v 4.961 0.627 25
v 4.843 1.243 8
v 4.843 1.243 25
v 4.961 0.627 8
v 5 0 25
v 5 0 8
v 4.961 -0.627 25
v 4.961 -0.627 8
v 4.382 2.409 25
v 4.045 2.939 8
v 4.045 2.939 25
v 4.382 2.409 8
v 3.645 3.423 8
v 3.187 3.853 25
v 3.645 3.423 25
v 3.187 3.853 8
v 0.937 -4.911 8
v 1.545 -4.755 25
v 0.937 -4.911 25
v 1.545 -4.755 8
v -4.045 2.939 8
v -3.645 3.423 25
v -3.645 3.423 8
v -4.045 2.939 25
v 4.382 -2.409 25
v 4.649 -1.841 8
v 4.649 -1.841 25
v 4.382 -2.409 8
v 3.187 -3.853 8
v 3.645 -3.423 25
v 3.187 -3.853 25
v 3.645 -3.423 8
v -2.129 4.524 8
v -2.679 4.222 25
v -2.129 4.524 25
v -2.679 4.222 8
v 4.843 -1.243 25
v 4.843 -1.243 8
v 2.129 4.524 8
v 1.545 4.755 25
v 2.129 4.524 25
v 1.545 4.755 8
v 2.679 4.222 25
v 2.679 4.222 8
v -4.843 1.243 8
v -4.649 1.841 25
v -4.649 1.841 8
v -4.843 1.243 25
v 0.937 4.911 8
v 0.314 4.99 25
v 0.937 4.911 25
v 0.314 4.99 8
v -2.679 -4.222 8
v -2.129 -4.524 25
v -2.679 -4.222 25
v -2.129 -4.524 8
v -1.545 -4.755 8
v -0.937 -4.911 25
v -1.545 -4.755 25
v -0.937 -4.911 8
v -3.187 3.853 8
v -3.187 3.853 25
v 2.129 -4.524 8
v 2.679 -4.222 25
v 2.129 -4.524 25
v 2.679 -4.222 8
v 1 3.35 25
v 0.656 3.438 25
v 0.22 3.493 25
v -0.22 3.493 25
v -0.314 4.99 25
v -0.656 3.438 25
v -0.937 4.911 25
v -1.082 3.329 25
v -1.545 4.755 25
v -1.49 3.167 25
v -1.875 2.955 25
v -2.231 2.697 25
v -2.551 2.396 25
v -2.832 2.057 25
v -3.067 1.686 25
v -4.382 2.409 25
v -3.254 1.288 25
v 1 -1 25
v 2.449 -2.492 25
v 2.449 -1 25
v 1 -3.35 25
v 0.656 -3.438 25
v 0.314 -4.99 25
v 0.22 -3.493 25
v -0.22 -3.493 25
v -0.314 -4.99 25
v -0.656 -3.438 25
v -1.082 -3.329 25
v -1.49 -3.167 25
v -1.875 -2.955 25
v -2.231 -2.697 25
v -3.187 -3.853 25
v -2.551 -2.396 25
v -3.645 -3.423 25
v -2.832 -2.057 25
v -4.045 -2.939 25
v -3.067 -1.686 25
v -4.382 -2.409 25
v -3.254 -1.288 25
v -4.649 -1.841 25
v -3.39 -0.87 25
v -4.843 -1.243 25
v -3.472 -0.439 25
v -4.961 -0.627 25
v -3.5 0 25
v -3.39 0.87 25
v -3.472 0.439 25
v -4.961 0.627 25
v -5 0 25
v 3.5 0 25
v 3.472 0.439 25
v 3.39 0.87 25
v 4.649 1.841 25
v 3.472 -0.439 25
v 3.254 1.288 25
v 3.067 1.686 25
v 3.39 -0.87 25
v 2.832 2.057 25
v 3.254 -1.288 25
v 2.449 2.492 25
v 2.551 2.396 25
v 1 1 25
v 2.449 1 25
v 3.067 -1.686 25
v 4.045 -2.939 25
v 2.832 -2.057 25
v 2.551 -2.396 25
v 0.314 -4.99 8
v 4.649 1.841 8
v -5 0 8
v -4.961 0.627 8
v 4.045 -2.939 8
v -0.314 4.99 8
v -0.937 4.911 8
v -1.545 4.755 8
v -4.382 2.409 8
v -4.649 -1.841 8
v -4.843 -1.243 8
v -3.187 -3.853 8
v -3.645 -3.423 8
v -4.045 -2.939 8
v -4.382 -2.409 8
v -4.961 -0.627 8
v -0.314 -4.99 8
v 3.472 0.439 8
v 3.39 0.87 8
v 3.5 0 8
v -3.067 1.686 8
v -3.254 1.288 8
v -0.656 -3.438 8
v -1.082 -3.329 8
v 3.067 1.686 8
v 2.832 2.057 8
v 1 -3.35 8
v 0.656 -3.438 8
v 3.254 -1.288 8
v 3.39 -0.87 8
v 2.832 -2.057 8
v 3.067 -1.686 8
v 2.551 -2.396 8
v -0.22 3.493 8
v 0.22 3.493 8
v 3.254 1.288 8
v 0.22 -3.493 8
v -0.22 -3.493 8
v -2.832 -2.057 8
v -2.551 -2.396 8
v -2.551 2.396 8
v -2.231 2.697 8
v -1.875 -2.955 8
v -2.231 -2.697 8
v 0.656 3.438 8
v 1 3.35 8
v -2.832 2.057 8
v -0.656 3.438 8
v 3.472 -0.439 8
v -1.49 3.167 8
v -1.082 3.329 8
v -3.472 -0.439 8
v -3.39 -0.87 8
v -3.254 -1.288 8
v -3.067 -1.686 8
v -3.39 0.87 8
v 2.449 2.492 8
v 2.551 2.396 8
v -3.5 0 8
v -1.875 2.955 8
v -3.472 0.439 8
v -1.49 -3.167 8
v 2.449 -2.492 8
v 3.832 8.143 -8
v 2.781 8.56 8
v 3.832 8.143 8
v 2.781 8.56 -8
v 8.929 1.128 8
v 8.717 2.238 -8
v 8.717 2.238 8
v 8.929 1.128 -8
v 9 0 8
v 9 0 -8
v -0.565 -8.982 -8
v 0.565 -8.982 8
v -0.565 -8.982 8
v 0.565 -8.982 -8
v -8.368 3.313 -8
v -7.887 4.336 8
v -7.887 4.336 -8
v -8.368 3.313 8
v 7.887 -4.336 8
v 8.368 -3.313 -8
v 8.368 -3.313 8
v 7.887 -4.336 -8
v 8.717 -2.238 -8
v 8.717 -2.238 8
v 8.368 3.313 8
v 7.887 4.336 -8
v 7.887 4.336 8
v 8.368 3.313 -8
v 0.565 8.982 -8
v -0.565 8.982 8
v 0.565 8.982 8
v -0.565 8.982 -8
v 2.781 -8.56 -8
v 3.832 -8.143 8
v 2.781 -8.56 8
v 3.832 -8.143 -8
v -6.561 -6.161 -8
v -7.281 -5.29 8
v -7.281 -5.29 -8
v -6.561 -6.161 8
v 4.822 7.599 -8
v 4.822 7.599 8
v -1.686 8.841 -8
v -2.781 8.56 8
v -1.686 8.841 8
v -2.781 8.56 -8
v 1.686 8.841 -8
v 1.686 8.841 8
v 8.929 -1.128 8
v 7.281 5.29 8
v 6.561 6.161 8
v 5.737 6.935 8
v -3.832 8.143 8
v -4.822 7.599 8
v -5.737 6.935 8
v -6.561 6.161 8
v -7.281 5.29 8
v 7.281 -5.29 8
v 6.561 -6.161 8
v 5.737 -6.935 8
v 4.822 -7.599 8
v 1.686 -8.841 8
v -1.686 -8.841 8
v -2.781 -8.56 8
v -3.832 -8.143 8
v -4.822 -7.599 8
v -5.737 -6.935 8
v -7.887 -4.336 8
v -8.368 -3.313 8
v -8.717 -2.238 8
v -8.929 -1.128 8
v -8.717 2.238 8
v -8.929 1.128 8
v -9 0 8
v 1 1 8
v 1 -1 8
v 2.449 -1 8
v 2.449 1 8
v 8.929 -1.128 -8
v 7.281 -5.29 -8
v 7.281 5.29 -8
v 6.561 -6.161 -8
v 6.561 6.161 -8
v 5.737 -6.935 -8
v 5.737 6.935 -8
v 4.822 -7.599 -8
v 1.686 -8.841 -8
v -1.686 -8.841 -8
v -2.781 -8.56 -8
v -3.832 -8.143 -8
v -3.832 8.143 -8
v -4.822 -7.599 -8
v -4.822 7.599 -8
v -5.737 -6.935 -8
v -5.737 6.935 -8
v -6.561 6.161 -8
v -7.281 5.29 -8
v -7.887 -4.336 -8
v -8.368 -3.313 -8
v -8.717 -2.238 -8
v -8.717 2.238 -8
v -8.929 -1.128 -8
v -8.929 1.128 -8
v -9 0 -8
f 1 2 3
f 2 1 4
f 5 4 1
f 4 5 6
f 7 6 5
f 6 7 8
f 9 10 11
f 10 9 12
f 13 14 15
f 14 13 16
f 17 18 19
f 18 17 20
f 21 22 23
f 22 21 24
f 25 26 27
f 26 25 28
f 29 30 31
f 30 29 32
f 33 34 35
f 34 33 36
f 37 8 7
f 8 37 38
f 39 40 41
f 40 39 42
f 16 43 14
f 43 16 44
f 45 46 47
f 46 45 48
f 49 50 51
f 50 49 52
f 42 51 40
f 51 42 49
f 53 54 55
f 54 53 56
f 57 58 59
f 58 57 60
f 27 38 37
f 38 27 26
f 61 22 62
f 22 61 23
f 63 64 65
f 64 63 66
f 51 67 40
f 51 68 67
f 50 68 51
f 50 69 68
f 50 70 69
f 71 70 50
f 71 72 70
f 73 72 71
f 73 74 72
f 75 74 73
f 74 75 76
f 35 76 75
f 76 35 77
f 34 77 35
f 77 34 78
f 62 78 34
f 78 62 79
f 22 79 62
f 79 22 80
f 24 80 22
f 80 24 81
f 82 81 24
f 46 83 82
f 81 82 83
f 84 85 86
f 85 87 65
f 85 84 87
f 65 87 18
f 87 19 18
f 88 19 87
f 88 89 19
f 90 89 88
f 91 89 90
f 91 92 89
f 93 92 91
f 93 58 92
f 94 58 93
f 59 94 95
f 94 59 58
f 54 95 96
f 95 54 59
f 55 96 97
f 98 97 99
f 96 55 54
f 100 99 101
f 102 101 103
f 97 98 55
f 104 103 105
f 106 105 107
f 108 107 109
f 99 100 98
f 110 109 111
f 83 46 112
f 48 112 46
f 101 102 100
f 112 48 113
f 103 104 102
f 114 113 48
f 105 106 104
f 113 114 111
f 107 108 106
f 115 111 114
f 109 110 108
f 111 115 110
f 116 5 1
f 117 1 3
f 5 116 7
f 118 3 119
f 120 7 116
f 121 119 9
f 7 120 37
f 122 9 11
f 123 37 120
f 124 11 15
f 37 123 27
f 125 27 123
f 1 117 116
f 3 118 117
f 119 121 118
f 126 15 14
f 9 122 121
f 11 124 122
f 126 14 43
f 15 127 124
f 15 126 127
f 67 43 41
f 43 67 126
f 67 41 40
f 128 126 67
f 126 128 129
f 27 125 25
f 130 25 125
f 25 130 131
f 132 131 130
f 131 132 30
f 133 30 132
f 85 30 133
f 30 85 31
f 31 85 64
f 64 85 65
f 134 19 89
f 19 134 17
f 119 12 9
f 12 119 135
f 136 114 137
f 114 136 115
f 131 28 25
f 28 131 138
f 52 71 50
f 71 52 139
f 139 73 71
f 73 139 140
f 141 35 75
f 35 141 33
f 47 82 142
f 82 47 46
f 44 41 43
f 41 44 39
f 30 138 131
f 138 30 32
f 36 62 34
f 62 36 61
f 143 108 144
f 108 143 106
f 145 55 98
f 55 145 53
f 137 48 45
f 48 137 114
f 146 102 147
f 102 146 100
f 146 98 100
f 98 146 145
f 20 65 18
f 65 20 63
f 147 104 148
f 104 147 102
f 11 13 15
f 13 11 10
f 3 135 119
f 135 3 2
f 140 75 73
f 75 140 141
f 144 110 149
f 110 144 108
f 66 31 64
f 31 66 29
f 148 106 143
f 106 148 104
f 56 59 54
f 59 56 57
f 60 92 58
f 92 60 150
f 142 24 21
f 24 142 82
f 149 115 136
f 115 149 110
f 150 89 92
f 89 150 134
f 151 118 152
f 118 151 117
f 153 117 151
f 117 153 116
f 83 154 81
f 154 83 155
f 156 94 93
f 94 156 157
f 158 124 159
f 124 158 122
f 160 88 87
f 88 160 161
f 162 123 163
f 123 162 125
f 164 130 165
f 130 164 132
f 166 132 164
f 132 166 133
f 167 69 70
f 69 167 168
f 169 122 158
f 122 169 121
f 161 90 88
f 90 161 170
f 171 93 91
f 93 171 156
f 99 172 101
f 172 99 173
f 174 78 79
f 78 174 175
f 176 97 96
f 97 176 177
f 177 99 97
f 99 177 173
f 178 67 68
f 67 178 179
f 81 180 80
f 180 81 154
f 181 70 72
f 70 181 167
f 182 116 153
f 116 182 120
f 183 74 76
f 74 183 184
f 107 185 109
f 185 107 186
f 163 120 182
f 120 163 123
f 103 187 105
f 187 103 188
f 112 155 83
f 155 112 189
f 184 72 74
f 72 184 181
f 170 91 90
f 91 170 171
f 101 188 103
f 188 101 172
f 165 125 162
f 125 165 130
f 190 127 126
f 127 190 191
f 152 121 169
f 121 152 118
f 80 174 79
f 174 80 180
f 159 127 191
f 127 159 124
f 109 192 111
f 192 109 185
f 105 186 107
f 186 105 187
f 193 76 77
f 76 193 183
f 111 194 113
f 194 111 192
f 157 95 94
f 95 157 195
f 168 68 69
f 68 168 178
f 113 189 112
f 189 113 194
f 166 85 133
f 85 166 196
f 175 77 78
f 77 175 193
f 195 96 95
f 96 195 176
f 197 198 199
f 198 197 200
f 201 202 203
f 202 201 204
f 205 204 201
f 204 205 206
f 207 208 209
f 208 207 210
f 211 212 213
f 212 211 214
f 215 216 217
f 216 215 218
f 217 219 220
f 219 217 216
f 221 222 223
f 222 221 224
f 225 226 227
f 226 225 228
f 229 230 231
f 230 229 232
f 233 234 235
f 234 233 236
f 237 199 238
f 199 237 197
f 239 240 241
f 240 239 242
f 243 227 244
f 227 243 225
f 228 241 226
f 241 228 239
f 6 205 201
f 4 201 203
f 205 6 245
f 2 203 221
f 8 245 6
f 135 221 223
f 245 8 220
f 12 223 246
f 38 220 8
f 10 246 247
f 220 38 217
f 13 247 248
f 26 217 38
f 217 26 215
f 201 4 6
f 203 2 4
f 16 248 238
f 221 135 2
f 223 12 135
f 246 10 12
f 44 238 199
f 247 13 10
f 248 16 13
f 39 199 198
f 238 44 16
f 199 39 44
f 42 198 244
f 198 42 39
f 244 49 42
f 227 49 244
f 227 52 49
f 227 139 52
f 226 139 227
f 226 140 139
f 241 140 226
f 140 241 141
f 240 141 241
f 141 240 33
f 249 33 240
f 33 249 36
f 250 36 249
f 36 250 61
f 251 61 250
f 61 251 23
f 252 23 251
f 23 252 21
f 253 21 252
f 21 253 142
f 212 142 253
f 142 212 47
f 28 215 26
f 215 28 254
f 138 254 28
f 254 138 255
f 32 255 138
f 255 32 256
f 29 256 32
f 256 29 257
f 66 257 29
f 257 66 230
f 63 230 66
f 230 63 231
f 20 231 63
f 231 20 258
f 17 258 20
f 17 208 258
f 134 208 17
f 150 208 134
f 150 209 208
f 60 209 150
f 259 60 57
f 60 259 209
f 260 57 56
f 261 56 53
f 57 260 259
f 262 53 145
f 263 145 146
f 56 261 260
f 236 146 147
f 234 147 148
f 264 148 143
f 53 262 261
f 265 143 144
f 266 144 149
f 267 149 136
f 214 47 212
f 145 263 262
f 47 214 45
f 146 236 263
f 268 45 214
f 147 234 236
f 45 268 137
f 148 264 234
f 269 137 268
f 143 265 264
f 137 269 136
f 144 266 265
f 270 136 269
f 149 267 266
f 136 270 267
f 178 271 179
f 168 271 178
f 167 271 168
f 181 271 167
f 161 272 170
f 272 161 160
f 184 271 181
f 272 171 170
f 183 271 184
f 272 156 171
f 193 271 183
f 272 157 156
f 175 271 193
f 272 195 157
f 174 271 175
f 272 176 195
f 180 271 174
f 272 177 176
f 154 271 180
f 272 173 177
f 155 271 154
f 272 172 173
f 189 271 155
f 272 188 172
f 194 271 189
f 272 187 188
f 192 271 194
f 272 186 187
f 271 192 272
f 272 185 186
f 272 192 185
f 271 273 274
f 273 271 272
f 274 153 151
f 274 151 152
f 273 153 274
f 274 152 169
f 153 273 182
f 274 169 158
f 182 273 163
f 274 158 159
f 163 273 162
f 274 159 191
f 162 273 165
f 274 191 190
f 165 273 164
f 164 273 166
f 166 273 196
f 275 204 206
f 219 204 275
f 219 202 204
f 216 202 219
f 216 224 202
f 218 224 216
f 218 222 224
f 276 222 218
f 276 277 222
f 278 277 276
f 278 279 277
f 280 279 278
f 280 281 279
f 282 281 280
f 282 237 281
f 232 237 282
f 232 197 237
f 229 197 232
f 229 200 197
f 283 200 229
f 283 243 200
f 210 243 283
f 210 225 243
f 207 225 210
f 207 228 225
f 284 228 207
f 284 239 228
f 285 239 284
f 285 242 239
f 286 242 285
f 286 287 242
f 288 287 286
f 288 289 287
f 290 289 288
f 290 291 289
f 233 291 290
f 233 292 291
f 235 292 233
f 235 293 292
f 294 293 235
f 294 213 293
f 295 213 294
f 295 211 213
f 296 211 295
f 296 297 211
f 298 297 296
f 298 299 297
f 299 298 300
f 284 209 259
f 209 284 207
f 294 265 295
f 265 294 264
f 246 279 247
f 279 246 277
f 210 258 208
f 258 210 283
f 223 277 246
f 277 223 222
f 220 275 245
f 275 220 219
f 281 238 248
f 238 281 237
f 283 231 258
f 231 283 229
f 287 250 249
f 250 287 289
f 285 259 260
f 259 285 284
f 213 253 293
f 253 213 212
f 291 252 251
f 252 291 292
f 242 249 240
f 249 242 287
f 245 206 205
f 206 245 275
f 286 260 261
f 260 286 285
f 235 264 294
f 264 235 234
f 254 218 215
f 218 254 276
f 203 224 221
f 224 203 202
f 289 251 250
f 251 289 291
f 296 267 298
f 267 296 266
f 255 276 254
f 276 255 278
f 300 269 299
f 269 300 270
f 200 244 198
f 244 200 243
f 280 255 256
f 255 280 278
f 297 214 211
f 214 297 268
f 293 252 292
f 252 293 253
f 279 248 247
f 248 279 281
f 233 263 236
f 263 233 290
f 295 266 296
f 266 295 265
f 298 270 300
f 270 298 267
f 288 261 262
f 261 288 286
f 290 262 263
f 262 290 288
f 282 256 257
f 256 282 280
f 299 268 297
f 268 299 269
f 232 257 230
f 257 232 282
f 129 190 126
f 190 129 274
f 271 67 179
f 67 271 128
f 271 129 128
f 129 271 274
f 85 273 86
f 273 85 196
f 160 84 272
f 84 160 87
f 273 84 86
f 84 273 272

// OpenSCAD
//design and code by bioprint (http://www.thingiverse.com/bioprint)
//This code generates a knob with a D-shaft (customizable)
// 2013-12-07:	first design



// Top diameter
TopDiameter=18;
// Top height
TopHeight = 16; // [16]
// Shaft length
ShaftLength=18;
// Shaft outer diameter
ShaftOuterDiameter=10;
// Shaft inner diameter
ShaftInnerDiameter=7;
// Shaft pin width
ShaftPinWidth=2;
// XOffset
XOffset =1;



cylinder (h = TopHeight, r=TopDiameter/2, center = true, $fn=50);


difference() {
    			translate([0, 0, TopHeight])
    				cylinder (h = ShaftLength, r=ShaftOuterDiameter/2, center = true, $fn=50);
			translate([0, 0, TopHeight])
				cylinder (h = ShaftLength, r=ShaftInnerDiameter/2, center = true, $fn=50);
}

// add pins
PinHolderY=ShaftInnerDiameter/2-ShaftPinWidth/2;
PinholderX=sqrt(ShaftInnerDiameter*ShaftInnerDiameter/4-PinHolderY*PinHolderY)-XOffset;

translate([PinholderX/2+XOffset, PinHolderY/2+ShaftPinWidth/2, TopHeight]) 
	cube(size = [PinholderX,PinHolderY,ShaftLength], center = true);

translate([PinholderX/2+XOffset, 0-PinHolderY/2-ShaftPinWidth/2, TopHeight]) 
	cube(size = [PinholderX,PinHolderY,ShaftLength], center = true);
